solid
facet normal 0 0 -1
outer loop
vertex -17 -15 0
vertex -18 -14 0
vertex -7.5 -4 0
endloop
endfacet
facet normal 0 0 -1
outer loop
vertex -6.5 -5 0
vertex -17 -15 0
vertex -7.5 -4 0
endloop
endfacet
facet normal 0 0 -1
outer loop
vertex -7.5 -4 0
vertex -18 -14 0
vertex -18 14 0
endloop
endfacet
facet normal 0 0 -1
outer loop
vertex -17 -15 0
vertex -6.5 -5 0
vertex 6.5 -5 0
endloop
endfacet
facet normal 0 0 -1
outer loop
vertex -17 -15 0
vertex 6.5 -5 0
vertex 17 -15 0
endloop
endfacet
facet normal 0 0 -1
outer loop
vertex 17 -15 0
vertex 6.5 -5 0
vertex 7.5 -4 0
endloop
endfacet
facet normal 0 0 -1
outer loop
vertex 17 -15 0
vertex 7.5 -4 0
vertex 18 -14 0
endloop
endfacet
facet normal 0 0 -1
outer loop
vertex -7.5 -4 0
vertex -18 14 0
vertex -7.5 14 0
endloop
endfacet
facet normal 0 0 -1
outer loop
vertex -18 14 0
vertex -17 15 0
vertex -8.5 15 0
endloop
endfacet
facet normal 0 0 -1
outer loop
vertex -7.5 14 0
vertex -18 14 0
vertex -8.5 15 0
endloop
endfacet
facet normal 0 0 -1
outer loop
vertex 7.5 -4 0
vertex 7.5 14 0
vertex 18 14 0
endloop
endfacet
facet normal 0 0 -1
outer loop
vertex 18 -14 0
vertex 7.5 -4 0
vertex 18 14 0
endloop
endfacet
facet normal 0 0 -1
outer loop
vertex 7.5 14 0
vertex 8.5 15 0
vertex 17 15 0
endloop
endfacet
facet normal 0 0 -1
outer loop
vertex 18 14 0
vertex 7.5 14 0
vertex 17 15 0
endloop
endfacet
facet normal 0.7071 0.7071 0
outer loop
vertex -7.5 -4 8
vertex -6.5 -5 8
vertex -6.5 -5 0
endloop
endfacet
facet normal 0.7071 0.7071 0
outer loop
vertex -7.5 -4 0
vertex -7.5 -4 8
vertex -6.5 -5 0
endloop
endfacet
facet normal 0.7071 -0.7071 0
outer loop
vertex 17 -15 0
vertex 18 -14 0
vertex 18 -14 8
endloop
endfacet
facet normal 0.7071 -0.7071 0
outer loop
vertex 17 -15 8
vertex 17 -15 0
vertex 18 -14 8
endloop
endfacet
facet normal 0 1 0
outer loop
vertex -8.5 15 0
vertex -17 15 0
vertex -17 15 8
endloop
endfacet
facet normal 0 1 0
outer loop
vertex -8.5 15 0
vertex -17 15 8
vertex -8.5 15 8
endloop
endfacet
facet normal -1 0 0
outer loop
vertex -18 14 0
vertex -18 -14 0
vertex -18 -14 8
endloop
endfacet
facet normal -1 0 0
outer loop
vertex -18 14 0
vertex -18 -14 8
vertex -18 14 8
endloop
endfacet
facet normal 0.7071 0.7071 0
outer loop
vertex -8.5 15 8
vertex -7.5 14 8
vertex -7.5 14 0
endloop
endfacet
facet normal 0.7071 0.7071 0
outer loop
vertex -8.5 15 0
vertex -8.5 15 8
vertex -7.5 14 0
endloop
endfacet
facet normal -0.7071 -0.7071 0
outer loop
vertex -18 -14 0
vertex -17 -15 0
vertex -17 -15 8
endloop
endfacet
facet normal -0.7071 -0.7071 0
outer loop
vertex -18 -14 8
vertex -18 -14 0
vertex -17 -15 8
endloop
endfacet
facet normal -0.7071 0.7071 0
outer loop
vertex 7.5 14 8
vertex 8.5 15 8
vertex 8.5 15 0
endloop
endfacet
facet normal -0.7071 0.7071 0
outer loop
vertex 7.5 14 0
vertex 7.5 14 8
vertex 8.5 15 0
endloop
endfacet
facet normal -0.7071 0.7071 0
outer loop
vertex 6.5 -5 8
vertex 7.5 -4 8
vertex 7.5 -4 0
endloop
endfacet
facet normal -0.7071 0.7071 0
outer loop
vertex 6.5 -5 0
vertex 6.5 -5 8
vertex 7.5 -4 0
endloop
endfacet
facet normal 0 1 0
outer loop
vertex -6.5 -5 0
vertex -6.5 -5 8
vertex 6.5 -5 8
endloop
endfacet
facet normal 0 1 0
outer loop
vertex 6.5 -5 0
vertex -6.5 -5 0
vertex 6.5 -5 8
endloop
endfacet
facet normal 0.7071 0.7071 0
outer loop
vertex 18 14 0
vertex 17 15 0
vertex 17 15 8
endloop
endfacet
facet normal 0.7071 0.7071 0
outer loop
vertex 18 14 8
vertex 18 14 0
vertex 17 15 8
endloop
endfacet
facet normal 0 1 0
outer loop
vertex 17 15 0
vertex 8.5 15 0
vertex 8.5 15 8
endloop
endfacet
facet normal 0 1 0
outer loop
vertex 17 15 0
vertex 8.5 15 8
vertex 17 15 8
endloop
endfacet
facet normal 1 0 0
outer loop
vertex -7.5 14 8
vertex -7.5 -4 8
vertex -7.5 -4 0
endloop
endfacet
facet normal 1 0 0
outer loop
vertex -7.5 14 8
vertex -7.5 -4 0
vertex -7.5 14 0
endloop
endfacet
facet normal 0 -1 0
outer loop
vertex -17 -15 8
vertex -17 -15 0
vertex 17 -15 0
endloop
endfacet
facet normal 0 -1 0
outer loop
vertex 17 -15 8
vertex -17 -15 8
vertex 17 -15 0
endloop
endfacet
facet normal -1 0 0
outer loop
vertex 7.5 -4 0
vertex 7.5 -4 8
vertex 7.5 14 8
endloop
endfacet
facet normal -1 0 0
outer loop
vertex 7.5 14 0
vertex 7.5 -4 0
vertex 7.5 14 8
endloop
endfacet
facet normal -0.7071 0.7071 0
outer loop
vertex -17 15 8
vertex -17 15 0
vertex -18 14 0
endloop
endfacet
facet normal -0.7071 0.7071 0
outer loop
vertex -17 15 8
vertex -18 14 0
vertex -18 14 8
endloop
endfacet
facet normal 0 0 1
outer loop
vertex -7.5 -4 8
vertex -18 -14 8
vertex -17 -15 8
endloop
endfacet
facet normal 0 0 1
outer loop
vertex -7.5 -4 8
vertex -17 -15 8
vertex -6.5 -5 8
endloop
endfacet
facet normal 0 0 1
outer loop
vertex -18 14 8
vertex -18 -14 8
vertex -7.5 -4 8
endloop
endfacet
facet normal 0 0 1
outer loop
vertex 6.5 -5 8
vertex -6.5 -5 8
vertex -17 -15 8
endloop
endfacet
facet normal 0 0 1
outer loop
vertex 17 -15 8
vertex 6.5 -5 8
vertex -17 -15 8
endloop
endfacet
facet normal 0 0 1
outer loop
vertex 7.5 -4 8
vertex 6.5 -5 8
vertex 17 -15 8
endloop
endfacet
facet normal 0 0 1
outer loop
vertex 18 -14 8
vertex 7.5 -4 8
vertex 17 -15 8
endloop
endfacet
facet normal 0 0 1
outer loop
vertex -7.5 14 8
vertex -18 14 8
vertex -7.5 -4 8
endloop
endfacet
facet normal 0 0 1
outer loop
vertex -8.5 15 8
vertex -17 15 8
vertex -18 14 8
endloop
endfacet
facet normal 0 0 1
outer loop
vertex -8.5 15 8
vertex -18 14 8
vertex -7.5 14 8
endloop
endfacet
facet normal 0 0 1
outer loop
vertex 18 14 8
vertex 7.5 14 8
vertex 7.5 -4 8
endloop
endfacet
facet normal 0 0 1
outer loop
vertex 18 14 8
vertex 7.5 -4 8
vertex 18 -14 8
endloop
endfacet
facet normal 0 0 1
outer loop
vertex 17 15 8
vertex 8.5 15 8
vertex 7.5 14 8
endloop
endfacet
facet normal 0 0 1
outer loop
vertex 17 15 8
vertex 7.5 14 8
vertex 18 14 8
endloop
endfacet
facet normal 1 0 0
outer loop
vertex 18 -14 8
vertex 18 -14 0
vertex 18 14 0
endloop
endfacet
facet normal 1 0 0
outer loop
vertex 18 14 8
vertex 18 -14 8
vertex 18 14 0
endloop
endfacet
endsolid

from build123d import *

# Parameters (mm, degrees)
SKETCH_1_W          = 36
SKETCH_1_H          = 30
EXTRUDE_1_DEPTH     = 8
CUT_EXTRUDE_1_REACH = 26.759
SKETCH_9_W          = 15
SKETCH_9_H          = 20
CHAMFER_1_SIZE      = 1
CHAMFER_2_SIZE      = 1
CHAMFER_3_SIZE      = 1


with BuildPart() as part:
    # 草图1 → 凸台-拉伸1 (new body)
    with BuildSketch(Plane.XY):
        Rectangle(SKETCH_1_W, SKETCH_1_H)
    extrude(amount=EXTRUDE_1_DEPTH)

    # 草图9 → 切除-拉伸1 (cut, up to next)
    with BuildSketch(Plane.XY.offset(8), mode=Mode.PRIVATE) as cut_extrude_1_sk1:
        with Locations((0, 5)):
            Rectangle(SKETCH_9_W, SKETCH_9_H)
    cut_extrude_1_tool1 = extrude(cut_extrude_1_sk1.sketch, amount=-CUT_EXTRUDE_1_REACH, mode=Mode.PRIVATE) & part.part
    add(cut_extrude_1_tool1.solids().sort_by_distance((0, 5, 8))[0], mode=Mode.SUBTRACT)

    # 倒角1
    chamfer_1_edges = [part.edges().sort_by_distance(p)[0] for p in [
        (18, -15, 4),
        (-18, -15, 4),
        (-18, 15, 4),
        (18, 15, 4),
    ]]
    chamfer(chamfer_1_edges, length=CHAMFER_1_SIZE)

    # 倒角2
    chamfer_2_edges = [part.edges().sort_by_distance(p)[0] for p in [
        (-7.5, 15, 4),
        (7.5, 15, 4),
    ]]
    chamfer(chamfer_2_edges, length=CHAMFER_2_SIZE)

    # 倒角3
    chamfer_3_edges = [part.edges().sort_by_distance(p)[0] for p in [
        (7.5, -5, 4),
        (-7.5, -5, 4),
    ]]
    chamfer(chamfer_3_edges, length=CHAMFER_3_SIZE)


solid = part.part
